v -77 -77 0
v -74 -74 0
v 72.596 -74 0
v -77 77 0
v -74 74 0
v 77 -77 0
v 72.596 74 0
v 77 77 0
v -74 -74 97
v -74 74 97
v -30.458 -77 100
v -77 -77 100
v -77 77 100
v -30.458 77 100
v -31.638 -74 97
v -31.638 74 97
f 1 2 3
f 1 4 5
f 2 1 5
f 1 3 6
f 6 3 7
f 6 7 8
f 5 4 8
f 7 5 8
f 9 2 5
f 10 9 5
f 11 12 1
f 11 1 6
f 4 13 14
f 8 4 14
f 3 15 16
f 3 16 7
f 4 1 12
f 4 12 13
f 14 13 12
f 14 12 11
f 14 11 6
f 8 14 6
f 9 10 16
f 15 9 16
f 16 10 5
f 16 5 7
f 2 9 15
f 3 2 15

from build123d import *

# Parameters (mm, degrees)
ESQUISSE1_W             = 154
ESQUISSE1_H             = 154
BOSS_EXTRU_1_DEPTH      = 100
ENL_V_MAT_EXTRU_1_DEPTH = 200.110522073
COQUE2_T                = -3


with BuildPart() as part:
    # Esquisse1 → Boss.-Extru.1 (new body)
    with BuildSketch(Plane.XY):
        Rectangle(ESQUISSE1_W, ESQUISSE1_H)
    extrude(amount=BOSS_EXTRU_1_DEPTH)

    # Esquisse2 → Enlèv. mat.-Extru.1 (cut, through all)
    with BuildSketch(Plane.XZ.offset(77)):
        Polygon((-30.458383107, 100), (77, 0), (77, 100), align=None)
    extrude(amount=-ENL_V_MAT_EXTRU_1_DEPTH, mode=Mode.SUBTRACT)

    # Coque2
    coque2_openings = [part.faces().sort_by_distance(p)[0] for p in [
        (0, 0, 0),
    ]]
    offset(amount=COQUE2_T, openings=coque2_openings, kind=Kind.INTERSECTION)


solid = part.part
